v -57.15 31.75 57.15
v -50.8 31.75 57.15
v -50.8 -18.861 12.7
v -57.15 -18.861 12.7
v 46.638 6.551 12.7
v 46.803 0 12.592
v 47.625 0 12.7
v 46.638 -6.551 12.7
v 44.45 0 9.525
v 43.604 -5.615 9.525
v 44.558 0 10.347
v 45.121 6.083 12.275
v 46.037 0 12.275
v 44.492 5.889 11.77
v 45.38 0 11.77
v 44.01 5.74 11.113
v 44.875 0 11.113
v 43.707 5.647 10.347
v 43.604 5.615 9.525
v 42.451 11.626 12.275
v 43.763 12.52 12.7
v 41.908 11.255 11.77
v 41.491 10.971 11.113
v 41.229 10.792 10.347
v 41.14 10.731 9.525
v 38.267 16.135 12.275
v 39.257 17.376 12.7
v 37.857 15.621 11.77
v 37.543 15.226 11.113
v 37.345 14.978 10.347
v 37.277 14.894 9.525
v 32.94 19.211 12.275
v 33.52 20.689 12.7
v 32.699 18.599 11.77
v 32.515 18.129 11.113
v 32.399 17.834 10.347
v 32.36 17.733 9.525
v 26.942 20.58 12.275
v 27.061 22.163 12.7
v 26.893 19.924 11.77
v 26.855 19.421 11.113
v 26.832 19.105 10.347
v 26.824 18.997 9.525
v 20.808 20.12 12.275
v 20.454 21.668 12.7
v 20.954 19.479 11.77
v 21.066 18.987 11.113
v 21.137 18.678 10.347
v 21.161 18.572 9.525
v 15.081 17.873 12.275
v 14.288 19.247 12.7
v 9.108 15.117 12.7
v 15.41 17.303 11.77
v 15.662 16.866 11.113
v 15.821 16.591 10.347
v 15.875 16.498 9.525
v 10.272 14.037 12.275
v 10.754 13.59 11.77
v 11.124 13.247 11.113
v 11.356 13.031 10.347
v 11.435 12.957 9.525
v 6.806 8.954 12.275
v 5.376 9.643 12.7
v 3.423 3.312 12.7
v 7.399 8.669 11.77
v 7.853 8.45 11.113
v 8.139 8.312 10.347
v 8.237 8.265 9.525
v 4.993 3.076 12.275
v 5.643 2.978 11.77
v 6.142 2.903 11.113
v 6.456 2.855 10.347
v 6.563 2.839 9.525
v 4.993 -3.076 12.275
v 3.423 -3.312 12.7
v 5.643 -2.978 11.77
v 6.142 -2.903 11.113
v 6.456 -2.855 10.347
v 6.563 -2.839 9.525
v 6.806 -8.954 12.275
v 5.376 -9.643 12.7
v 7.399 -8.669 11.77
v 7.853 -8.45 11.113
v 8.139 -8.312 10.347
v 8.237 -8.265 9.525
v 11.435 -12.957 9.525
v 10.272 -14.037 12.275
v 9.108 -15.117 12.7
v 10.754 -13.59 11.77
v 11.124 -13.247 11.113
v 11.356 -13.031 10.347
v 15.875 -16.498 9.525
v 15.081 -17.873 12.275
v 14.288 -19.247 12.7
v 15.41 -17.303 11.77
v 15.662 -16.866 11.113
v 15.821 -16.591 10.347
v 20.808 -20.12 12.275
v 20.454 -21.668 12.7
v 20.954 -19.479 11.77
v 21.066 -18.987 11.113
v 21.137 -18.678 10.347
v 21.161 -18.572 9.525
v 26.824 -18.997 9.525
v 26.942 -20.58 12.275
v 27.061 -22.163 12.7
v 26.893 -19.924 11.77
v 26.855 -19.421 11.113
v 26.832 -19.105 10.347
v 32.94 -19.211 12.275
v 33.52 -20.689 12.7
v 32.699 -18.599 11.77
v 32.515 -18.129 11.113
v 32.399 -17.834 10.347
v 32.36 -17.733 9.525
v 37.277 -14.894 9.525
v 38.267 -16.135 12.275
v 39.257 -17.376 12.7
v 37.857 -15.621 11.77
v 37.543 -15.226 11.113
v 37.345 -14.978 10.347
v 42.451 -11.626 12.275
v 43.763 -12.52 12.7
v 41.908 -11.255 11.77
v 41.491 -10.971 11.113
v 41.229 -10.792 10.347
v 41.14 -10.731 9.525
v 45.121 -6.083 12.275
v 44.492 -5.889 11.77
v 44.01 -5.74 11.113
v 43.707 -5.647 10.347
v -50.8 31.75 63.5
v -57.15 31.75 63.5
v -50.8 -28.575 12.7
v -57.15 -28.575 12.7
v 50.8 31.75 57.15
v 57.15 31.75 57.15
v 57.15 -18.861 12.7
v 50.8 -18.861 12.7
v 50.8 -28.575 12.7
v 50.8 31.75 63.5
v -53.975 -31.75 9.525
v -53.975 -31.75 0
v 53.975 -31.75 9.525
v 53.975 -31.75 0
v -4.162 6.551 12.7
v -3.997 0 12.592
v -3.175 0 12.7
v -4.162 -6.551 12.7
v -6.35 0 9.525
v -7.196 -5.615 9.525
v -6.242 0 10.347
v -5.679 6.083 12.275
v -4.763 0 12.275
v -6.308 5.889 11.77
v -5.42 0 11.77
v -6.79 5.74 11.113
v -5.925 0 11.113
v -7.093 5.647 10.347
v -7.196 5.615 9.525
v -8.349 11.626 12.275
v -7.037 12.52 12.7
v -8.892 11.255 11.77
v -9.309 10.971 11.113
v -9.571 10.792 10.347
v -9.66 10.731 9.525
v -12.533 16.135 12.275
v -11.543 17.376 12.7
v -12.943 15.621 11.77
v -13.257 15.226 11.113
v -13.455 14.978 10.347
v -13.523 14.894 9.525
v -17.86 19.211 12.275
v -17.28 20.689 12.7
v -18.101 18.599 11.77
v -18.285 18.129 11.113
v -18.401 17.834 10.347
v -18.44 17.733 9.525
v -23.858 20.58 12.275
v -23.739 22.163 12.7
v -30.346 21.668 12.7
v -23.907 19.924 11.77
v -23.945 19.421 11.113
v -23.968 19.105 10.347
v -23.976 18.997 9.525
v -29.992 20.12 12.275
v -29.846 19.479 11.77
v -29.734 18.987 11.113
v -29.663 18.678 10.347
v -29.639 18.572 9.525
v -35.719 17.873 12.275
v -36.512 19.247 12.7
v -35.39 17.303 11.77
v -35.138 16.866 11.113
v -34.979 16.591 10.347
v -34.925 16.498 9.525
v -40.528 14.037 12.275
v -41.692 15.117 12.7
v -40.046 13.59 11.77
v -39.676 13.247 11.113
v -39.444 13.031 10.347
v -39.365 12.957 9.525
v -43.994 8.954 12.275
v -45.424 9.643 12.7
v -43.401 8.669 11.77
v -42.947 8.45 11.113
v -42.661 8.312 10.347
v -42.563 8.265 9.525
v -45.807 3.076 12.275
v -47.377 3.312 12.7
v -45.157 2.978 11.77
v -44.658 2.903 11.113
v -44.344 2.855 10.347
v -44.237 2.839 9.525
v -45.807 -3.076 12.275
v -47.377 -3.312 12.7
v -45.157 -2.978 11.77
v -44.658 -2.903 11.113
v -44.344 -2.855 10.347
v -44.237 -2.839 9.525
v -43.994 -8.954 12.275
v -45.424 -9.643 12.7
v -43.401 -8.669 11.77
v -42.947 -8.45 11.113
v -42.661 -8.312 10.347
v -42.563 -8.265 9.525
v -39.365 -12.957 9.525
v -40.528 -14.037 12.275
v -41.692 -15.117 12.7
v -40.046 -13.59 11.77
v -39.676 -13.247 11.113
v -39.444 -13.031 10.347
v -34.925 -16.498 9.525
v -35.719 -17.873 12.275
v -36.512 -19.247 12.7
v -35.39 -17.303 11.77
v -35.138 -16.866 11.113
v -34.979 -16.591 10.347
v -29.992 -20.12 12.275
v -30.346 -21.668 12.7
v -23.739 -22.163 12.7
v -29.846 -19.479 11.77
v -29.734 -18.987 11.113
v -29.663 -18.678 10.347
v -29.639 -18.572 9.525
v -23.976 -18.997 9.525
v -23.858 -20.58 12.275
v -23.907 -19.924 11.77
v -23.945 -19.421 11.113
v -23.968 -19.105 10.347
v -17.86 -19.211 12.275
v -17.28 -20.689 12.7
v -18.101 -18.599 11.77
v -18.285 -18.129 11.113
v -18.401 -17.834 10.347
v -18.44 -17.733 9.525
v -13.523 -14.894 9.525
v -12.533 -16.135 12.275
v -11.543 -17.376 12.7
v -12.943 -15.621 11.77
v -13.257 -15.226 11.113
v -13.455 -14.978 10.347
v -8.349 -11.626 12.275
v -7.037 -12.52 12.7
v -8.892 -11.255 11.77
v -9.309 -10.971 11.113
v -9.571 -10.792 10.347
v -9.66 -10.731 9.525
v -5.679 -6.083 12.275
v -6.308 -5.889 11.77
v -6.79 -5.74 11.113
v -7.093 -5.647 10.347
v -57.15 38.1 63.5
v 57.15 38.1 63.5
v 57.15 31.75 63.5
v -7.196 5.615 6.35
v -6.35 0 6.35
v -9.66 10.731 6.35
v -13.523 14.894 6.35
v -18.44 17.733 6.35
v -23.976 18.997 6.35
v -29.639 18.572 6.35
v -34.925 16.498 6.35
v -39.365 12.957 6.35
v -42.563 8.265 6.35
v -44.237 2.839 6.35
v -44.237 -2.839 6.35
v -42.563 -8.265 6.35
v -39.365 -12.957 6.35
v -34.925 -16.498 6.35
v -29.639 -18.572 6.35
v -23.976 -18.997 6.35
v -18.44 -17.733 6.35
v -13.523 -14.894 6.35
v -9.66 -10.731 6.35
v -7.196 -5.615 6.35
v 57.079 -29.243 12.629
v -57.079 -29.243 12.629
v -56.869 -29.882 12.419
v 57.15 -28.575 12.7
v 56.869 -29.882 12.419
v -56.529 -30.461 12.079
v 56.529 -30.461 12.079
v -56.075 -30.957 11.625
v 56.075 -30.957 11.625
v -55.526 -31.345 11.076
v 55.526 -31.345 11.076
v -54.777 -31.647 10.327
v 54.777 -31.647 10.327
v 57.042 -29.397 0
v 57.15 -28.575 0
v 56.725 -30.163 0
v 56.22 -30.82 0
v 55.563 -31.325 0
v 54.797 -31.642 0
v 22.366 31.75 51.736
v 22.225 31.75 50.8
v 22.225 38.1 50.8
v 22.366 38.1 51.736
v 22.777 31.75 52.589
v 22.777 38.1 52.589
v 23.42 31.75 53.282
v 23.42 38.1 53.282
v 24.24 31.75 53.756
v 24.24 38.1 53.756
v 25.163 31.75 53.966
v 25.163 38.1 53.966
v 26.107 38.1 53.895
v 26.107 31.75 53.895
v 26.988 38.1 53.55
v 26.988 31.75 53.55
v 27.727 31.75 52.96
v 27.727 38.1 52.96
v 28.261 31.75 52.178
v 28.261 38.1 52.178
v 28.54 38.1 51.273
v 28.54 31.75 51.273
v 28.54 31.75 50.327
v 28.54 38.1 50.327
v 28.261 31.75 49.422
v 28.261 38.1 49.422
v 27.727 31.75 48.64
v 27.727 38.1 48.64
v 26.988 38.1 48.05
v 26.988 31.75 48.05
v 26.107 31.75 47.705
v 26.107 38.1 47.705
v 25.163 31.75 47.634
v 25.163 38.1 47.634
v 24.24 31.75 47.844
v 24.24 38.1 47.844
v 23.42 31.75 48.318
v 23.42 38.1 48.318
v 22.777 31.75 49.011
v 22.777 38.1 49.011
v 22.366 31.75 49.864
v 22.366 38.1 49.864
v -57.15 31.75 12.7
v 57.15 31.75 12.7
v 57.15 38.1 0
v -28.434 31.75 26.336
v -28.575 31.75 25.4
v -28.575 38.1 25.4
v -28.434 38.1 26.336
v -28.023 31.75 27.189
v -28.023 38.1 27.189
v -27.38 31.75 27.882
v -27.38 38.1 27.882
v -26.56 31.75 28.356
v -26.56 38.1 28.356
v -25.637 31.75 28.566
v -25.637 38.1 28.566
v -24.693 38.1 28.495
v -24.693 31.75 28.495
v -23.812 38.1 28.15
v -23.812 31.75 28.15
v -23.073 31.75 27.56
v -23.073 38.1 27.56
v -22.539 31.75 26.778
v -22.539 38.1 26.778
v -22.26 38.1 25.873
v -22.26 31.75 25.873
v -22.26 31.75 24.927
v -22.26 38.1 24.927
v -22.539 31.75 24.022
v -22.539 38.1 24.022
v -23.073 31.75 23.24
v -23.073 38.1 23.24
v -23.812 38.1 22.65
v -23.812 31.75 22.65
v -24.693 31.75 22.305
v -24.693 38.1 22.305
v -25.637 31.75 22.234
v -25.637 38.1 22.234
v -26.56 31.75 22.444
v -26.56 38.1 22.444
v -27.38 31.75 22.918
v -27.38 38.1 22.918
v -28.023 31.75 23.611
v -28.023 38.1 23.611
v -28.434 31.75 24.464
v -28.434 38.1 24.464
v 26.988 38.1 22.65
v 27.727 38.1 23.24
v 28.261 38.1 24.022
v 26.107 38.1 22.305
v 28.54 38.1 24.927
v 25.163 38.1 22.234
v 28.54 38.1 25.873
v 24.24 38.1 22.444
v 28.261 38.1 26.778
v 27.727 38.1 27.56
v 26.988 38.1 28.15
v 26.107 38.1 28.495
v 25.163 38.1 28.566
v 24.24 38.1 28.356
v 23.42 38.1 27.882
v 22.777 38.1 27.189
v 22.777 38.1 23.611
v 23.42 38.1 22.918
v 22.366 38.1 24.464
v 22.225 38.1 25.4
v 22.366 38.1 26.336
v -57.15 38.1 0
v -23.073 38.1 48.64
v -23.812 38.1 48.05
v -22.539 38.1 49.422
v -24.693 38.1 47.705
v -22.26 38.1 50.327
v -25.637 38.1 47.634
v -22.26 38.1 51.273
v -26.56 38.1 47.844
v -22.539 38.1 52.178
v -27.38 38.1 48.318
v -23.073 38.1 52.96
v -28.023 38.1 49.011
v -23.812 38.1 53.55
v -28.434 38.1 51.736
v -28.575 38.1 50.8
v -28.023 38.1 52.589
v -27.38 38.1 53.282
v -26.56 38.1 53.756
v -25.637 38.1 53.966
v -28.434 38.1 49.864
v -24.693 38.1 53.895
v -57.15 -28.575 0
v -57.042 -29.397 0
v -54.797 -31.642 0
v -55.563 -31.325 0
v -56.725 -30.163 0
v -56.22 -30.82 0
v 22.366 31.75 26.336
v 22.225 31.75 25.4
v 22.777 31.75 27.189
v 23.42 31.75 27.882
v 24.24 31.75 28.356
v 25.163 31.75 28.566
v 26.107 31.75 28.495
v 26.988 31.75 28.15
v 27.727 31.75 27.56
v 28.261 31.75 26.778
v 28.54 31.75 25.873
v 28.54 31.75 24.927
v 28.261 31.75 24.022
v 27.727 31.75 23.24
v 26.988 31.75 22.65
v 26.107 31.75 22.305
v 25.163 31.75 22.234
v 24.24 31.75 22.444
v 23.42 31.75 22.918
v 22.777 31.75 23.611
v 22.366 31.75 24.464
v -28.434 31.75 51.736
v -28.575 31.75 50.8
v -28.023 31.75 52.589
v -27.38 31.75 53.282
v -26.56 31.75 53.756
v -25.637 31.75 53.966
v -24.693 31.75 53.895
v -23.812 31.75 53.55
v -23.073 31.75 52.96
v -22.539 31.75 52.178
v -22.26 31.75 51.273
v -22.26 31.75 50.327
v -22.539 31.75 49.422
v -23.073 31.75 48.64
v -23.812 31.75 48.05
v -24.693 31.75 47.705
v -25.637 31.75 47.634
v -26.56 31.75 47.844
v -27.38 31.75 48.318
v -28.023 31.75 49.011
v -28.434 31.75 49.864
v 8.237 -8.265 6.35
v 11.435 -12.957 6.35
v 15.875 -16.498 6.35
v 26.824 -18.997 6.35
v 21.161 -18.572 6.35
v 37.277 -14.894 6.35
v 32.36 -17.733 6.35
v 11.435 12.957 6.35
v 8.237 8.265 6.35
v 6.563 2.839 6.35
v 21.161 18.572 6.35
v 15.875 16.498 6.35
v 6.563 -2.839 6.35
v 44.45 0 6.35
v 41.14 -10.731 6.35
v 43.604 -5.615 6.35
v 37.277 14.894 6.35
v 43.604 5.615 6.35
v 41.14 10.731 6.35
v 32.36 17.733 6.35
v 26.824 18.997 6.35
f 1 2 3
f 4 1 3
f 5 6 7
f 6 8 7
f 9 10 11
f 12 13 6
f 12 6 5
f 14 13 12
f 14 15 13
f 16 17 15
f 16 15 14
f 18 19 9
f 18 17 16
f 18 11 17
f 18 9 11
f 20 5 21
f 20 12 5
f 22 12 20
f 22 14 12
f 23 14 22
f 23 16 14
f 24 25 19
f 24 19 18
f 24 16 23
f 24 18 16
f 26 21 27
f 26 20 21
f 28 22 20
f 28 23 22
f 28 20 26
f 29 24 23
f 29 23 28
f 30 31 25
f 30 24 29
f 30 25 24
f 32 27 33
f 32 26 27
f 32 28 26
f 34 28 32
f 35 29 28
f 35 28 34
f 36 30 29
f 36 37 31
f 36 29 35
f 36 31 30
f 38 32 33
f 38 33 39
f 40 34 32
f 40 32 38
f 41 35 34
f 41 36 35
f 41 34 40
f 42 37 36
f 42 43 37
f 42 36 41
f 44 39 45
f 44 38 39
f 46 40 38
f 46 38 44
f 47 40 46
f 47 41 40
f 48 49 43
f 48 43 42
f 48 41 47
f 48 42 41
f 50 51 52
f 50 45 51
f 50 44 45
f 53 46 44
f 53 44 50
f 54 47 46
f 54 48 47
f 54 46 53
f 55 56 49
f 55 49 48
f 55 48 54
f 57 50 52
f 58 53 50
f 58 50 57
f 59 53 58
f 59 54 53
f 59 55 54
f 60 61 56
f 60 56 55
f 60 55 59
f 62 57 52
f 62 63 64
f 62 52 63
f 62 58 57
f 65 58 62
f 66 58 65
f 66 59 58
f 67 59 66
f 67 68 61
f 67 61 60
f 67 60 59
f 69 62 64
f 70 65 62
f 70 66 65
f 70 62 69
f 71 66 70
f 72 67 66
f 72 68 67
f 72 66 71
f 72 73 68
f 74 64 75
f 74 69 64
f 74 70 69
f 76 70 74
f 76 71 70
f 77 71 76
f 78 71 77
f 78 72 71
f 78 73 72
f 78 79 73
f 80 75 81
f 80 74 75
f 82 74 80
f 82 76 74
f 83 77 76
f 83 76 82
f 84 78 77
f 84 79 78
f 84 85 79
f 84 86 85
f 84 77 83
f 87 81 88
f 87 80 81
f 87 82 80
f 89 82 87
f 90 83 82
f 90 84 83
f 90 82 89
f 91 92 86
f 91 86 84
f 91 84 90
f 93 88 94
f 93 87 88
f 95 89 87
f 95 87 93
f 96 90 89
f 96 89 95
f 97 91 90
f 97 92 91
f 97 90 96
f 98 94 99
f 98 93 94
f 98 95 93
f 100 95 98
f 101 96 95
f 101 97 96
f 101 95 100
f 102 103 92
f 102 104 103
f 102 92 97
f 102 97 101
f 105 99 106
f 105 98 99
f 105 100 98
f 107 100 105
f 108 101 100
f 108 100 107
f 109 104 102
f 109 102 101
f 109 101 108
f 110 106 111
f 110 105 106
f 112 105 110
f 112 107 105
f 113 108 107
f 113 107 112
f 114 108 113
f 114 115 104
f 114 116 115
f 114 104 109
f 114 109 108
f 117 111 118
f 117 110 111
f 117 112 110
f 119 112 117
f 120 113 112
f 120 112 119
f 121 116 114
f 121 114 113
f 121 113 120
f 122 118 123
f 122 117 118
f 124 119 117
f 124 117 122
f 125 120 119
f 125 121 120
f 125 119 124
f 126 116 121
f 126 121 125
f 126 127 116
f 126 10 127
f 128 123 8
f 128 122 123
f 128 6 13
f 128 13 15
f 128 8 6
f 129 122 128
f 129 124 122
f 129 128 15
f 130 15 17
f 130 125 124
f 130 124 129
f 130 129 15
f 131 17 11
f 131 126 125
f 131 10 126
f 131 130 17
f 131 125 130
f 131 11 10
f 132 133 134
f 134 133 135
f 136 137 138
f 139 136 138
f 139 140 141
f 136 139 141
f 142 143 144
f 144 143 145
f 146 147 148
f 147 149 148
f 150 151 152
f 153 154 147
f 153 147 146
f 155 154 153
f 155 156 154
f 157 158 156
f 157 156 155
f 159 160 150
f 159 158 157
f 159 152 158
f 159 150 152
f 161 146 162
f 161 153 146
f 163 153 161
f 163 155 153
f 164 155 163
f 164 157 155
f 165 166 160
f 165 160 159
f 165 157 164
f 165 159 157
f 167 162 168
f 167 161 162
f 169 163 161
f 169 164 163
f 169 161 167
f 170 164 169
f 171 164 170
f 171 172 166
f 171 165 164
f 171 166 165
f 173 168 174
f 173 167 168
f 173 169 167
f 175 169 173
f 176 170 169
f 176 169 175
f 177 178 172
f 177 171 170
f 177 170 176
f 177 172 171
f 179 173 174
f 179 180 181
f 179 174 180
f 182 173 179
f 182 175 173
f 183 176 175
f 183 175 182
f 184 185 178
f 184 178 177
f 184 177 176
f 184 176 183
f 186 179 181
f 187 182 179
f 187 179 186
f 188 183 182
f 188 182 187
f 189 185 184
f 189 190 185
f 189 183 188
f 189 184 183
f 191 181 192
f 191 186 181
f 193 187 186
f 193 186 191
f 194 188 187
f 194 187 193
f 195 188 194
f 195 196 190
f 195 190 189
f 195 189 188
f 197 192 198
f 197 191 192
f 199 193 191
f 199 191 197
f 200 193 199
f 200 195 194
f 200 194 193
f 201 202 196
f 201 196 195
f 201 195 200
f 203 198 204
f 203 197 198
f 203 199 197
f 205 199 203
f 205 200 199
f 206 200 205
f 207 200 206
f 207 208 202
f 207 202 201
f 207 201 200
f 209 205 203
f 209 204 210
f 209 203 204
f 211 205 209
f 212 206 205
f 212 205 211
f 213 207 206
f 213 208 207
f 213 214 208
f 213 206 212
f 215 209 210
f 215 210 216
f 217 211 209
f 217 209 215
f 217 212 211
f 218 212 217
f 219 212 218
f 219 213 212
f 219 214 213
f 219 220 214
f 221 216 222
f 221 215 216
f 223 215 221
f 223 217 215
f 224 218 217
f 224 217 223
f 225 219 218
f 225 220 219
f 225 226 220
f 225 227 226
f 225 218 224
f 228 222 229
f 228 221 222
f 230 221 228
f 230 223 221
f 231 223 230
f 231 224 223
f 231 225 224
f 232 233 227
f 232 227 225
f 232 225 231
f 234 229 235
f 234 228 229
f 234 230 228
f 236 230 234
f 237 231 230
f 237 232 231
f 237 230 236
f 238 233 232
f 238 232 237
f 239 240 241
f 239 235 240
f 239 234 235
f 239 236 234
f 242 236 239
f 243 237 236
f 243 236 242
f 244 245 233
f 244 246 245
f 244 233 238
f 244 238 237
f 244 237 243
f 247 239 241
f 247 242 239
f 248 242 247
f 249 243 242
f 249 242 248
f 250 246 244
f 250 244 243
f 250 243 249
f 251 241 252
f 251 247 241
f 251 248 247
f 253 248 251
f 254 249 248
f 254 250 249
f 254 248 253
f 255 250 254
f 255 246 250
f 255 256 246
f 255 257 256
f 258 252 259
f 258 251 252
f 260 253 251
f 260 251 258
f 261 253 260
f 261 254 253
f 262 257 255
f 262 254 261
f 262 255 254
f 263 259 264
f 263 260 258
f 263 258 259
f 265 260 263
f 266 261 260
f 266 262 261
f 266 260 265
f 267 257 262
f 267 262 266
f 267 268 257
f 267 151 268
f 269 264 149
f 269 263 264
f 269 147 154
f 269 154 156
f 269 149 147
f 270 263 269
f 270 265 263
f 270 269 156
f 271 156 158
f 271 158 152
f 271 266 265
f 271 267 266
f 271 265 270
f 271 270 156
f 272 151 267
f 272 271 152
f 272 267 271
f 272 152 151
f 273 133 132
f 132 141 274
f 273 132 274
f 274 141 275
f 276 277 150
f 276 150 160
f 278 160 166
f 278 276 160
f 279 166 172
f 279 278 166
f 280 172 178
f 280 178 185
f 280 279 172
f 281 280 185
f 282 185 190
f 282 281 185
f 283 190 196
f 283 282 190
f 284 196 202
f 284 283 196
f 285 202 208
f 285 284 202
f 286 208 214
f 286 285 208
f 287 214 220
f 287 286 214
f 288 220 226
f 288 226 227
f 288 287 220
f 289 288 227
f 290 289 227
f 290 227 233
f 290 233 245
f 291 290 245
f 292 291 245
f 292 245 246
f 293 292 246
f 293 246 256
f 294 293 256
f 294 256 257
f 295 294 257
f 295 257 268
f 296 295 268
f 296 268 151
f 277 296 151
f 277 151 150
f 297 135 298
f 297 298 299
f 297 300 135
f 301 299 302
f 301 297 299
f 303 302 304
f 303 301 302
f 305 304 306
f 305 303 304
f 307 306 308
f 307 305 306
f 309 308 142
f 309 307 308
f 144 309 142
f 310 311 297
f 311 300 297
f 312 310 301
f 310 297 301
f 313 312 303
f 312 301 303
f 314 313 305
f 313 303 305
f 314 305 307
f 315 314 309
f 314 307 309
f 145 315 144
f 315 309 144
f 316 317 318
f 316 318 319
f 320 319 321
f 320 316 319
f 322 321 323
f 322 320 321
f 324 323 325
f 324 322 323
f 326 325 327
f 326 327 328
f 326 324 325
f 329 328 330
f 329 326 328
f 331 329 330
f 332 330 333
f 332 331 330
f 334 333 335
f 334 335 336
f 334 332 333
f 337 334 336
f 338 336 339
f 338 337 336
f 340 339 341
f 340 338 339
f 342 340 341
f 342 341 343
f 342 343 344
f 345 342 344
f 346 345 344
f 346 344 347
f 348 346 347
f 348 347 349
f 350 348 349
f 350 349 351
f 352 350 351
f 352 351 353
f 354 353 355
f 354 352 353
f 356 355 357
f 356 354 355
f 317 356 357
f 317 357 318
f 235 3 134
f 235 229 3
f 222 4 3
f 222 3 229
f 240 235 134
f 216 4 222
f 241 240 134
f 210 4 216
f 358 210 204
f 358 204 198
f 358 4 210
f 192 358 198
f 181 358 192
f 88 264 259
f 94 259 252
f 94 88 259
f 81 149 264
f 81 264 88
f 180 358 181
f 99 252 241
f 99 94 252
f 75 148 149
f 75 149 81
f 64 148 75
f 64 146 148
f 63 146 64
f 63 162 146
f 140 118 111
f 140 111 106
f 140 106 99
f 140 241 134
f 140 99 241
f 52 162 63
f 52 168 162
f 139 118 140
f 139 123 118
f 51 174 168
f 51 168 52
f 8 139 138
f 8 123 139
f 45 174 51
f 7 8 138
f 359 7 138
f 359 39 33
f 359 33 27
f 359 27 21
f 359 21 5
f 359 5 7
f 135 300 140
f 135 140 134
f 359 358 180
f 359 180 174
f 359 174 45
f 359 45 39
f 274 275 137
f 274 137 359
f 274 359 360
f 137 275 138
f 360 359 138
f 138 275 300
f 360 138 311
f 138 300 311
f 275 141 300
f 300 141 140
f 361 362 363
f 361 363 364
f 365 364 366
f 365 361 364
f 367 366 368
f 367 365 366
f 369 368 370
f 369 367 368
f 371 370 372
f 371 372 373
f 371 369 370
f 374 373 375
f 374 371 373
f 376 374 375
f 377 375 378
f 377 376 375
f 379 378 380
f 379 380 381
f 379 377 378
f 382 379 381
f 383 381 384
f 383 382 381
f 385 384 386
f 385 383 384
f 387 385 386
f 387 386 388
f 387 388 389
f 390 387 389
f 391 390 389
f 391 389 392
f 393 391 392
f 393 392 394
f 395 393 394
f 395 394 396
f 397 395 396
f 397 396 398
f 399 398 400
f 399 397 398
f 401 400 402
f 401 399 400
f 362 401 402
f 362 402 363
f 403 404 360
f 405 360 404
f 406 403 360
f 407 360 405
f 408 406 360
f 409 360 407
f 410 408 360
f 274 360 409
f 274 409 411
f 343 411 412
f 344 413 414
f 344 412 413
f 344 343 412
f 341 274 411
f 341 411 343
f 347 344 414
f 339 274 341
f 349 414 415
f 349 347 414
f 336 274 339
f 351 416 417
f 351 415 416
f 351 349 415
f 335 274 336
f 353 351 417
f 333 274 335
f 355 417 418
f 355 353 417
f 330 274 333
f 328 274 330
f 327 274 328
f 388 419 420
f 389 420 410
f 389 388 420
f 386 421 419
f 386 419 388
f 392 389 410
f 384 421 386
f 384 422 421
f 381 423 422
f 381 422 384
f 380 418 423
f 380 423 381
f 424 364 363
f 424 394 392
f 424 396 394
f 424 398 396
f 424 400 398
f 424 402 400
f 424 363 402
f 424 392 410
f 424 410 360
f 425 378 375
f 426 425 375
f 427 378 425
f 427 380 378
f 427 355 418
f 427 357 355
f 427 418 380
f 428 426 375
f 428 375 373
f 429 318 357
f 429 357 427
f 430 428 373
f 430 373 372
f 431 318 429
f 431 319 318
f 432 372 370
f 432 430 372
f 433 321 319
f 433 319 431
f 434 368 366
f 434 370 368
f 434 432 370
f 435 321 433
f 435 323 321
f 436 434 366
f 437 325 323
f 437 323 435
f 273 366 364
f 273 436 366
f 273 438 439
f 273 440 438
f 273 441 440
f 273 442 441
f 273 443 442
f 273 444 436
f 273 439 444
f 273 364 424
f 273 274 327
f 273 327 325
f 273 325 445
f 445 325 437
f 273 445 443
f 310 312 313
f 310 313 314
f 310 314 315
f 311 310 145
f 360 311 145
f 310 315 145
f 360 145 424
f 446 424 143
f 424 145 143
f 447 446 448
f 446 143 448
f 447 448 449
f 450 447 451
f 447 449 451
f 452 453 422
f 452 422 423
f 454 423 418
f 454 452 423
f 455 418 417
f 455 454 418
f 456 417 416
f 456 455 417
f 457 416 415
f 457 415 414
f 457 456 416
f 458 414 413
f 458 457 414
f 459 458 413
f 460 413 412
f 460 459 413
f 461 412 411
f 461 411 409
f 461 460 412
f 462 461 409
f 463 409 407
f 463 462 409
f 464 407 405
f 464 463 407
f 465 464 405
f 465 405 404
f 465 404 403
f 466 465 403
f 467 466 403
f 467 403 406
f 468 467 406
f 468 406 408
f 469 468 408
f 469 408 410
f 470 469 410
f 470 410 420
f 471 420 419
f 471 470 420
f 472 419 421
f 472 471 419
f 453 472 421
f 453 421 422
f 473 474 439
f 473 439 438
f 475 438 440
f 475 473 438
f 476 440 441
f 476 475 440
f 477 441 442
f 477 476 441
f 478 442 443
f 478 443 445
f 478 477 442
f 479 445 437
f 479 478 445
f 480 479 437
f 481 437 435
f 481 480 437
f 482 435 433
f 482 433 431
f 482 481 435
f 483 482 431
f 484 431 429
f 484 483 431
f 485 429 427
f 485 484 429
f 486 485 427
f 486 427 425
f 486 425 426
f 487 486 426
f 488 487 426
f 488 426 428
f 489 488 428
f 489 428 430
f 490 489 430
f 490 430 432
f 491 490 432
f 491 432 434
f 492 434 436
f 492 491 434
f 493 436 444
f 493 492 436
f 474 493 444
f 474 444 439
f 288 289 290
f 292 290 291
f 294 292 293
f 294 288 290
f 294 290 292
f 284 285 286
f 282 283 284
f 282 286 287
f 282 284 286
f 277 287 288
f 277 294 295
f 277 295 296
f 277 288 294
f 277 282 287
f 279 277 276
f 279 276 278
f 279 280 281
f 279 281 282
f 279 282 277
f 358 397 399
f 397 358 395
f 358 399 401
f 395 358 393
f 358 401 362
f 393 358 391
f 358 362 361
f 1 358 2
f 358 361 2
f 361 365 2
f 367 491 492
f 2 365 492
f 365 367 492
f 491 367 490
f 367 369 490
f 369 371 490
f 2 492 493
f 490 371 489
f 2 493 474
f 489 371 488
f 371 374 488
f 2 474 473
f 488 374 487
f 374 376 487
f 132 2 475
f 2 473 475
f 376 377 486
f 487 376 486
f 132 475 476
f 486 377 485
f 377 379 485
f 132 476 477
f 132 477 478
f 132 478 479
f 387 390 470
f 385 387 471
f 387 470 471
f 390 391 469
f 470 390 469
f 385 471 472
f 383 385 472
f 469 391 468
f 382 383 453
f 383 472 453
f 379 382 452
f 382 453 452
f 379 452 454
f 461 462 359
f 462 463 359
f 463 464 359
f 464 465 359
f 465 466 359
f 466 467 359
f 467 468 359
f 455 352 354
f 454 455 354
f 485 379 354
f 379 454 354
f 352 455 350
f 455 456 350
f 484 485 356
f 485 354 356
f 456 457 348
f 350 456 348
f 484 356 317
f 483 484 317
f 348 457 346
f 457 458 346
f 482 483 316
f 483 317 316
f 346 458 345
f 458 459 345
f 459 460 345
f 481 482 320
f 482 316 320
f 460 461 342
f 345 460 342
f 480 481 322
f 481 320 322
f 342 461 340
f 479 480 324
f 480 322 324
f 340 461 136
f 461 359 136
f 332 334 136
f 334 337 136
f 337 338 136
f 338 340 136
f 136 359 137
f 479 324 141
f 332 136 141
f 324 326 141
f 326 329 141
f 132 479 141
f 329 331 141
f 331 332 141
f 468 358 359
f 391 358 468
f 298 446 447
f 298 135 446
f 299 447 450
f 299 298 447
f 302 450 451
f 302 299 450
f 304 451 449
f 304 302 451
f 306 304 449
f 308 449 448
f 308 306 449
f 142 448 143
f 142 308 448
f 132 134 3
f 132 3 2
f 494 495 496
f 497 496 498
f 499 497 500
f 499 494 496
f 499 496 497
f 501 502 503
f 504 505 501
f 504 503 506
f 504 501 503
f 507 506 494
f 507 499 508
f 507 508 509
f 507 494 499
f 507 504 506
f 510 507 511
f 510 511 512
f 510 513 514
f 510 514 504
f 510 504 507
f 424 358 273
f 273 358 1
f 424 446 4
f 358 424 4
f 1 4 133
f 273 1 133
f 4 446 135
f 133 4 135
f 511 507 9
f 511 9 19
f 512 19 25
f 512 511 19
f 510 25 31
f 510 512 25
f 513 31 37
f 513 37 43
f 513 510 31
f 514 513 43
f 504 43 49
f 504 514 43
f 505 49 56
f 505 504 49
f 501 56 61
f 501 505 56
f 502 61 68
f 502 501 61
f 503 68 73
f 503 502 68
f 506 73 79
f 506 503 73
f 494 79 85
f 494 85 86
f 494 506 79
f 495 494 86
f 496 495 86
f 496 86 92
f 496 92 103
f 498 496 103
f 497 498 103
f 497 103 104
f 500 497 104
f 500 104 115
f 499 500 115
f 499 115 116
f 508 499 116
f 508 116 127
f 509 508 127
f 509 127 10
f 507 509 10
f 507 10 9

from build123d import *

# Parameters (mm, degrees)
F0_W      = 114.3
F0_H      = 63.5
F0_R      = 19.05
F1_DEPTH  = 12.7
F2_DEPTH  = 6.35
F3_W      = 6.35
F3_H      = 60.325
F4_DEPTH  = 50.8
F6_DEPTH  = 114.301
F7_W      = 101.6
F7_H      = 50.8
F7_R      = 3.175
F8_DEPTH  = 6.35
F9_R      = 3.17499
F11_DEPTH = 114.301


# Not quite as in the source:
# - a fillet or chamfer is up to 0.001 mm smaller than in the source, because OpenCascade refuses the exact size


with BuildPart() as f1:
    # F0 (on Top) → F1 (new body)
    with BuildSketch(Plane.XY):
        Rectangle(F0_W, F0_H)
        with Locations((-25.4, 0)):
            Circle(F0_R, mode=Mode.SUBTRACT)
        with Locations((25.4, 0)):
            Circle(F0_R, mode=Mode.SUBTRACT)
    extrude(amount=F1_DEPTH)

    # F0 (on Top) → F2 (join)
    with BuildSketch(Plane.XY):
        with Locations((-25.4, 0)):
            Circle(F0_R)
        with Locations((25.4, 0)):
            Circle(F0_R)
    extrude(amount=F2_DEPTH)

    # F3 (on face) → F4 (join)
    with BuildSketch(Plane.XY.offset(12.7)):
        with Locations((-53.975, 1.5875)):
            Rectangle(F3_W, F3_H)
        with Locations((53.975, 1.5875)):
            Rectangle(F3_W, F3_H)
    extrude(amount=F4_DEPTH)

    # F5 (on face) → F6 (cut, through all)
    with BuildSketch(Plane(origin=(-57.15, 0, 0), x_dir=(0, -1, 0), z_dir=(-1, 0, 0))):
        Polygon((28.575, 63.5), (-31.75, 63.5), (28.575, 12.7), align=None)
    extrude(amount=-F6_DEPTH, mode=Mode.SUBTRACT)

    # F7 (on face) → F8 (join)
    with BuildSketch(Plane(origin=(0, 31.75, 0), x_dir=(-1, 0, 0), z_dir=(0, 1, 0))):
        Polygon((-50.8, 12.7), (-50.8, 63.5), (-57.15, 63.5), (-57.15, 0), (57.15, 0), (57.15, 63.5), (50.8, 63.5), (50.8, 12.7), align=None)
        with Locations((0, 38.1)):
            Rectangle(F7_W, F7_H)
        with Locations((-25.4, 25.4)):
            Circle(F7_R, mode=Mode.SUBTRACT)
        with Locations((25.4, 25.4)):
            Circle(F7_R, mode=Mode.SUBTRACT)
        with Locations((-25.4, 50.8)):
            Circle(F7_R, mode=Mode.SUBTRACT)
        with Locations((25.4, 50.8)):
            Circle(F7_R, mode=Mode.SUBTRACT)
    extrude(amount=F8_DEPTH)

    # F9 (radius 3.175 in the source; OpenCascade refuses exactly that, so slightly less here)
    f9_edges = [f1.edges().sort_by_distance(p)[0] for p in [
        (-44.45, 0, 12.7),
        (6.35, 0, 12.7),
        (0, -31.75, 12.7),
        (57.15, -31.75, 6.35),
        (-57.15, -31.75, 6.35),
    ]]
    fillet(f9_edges, radius=F9_R)

    # F10 (on face) → F11 (cut, through all)
    with BuildSketch(Plane.YZ.offset(57.15)):
        Polygon((31.75, 12.7), (31.75, 57.15), (-18.8612597303, 12.7), align=None)
    extrude(amount=-F11_DEPTH, mode=Mode.SUBTRACT)


solid = f1.part
